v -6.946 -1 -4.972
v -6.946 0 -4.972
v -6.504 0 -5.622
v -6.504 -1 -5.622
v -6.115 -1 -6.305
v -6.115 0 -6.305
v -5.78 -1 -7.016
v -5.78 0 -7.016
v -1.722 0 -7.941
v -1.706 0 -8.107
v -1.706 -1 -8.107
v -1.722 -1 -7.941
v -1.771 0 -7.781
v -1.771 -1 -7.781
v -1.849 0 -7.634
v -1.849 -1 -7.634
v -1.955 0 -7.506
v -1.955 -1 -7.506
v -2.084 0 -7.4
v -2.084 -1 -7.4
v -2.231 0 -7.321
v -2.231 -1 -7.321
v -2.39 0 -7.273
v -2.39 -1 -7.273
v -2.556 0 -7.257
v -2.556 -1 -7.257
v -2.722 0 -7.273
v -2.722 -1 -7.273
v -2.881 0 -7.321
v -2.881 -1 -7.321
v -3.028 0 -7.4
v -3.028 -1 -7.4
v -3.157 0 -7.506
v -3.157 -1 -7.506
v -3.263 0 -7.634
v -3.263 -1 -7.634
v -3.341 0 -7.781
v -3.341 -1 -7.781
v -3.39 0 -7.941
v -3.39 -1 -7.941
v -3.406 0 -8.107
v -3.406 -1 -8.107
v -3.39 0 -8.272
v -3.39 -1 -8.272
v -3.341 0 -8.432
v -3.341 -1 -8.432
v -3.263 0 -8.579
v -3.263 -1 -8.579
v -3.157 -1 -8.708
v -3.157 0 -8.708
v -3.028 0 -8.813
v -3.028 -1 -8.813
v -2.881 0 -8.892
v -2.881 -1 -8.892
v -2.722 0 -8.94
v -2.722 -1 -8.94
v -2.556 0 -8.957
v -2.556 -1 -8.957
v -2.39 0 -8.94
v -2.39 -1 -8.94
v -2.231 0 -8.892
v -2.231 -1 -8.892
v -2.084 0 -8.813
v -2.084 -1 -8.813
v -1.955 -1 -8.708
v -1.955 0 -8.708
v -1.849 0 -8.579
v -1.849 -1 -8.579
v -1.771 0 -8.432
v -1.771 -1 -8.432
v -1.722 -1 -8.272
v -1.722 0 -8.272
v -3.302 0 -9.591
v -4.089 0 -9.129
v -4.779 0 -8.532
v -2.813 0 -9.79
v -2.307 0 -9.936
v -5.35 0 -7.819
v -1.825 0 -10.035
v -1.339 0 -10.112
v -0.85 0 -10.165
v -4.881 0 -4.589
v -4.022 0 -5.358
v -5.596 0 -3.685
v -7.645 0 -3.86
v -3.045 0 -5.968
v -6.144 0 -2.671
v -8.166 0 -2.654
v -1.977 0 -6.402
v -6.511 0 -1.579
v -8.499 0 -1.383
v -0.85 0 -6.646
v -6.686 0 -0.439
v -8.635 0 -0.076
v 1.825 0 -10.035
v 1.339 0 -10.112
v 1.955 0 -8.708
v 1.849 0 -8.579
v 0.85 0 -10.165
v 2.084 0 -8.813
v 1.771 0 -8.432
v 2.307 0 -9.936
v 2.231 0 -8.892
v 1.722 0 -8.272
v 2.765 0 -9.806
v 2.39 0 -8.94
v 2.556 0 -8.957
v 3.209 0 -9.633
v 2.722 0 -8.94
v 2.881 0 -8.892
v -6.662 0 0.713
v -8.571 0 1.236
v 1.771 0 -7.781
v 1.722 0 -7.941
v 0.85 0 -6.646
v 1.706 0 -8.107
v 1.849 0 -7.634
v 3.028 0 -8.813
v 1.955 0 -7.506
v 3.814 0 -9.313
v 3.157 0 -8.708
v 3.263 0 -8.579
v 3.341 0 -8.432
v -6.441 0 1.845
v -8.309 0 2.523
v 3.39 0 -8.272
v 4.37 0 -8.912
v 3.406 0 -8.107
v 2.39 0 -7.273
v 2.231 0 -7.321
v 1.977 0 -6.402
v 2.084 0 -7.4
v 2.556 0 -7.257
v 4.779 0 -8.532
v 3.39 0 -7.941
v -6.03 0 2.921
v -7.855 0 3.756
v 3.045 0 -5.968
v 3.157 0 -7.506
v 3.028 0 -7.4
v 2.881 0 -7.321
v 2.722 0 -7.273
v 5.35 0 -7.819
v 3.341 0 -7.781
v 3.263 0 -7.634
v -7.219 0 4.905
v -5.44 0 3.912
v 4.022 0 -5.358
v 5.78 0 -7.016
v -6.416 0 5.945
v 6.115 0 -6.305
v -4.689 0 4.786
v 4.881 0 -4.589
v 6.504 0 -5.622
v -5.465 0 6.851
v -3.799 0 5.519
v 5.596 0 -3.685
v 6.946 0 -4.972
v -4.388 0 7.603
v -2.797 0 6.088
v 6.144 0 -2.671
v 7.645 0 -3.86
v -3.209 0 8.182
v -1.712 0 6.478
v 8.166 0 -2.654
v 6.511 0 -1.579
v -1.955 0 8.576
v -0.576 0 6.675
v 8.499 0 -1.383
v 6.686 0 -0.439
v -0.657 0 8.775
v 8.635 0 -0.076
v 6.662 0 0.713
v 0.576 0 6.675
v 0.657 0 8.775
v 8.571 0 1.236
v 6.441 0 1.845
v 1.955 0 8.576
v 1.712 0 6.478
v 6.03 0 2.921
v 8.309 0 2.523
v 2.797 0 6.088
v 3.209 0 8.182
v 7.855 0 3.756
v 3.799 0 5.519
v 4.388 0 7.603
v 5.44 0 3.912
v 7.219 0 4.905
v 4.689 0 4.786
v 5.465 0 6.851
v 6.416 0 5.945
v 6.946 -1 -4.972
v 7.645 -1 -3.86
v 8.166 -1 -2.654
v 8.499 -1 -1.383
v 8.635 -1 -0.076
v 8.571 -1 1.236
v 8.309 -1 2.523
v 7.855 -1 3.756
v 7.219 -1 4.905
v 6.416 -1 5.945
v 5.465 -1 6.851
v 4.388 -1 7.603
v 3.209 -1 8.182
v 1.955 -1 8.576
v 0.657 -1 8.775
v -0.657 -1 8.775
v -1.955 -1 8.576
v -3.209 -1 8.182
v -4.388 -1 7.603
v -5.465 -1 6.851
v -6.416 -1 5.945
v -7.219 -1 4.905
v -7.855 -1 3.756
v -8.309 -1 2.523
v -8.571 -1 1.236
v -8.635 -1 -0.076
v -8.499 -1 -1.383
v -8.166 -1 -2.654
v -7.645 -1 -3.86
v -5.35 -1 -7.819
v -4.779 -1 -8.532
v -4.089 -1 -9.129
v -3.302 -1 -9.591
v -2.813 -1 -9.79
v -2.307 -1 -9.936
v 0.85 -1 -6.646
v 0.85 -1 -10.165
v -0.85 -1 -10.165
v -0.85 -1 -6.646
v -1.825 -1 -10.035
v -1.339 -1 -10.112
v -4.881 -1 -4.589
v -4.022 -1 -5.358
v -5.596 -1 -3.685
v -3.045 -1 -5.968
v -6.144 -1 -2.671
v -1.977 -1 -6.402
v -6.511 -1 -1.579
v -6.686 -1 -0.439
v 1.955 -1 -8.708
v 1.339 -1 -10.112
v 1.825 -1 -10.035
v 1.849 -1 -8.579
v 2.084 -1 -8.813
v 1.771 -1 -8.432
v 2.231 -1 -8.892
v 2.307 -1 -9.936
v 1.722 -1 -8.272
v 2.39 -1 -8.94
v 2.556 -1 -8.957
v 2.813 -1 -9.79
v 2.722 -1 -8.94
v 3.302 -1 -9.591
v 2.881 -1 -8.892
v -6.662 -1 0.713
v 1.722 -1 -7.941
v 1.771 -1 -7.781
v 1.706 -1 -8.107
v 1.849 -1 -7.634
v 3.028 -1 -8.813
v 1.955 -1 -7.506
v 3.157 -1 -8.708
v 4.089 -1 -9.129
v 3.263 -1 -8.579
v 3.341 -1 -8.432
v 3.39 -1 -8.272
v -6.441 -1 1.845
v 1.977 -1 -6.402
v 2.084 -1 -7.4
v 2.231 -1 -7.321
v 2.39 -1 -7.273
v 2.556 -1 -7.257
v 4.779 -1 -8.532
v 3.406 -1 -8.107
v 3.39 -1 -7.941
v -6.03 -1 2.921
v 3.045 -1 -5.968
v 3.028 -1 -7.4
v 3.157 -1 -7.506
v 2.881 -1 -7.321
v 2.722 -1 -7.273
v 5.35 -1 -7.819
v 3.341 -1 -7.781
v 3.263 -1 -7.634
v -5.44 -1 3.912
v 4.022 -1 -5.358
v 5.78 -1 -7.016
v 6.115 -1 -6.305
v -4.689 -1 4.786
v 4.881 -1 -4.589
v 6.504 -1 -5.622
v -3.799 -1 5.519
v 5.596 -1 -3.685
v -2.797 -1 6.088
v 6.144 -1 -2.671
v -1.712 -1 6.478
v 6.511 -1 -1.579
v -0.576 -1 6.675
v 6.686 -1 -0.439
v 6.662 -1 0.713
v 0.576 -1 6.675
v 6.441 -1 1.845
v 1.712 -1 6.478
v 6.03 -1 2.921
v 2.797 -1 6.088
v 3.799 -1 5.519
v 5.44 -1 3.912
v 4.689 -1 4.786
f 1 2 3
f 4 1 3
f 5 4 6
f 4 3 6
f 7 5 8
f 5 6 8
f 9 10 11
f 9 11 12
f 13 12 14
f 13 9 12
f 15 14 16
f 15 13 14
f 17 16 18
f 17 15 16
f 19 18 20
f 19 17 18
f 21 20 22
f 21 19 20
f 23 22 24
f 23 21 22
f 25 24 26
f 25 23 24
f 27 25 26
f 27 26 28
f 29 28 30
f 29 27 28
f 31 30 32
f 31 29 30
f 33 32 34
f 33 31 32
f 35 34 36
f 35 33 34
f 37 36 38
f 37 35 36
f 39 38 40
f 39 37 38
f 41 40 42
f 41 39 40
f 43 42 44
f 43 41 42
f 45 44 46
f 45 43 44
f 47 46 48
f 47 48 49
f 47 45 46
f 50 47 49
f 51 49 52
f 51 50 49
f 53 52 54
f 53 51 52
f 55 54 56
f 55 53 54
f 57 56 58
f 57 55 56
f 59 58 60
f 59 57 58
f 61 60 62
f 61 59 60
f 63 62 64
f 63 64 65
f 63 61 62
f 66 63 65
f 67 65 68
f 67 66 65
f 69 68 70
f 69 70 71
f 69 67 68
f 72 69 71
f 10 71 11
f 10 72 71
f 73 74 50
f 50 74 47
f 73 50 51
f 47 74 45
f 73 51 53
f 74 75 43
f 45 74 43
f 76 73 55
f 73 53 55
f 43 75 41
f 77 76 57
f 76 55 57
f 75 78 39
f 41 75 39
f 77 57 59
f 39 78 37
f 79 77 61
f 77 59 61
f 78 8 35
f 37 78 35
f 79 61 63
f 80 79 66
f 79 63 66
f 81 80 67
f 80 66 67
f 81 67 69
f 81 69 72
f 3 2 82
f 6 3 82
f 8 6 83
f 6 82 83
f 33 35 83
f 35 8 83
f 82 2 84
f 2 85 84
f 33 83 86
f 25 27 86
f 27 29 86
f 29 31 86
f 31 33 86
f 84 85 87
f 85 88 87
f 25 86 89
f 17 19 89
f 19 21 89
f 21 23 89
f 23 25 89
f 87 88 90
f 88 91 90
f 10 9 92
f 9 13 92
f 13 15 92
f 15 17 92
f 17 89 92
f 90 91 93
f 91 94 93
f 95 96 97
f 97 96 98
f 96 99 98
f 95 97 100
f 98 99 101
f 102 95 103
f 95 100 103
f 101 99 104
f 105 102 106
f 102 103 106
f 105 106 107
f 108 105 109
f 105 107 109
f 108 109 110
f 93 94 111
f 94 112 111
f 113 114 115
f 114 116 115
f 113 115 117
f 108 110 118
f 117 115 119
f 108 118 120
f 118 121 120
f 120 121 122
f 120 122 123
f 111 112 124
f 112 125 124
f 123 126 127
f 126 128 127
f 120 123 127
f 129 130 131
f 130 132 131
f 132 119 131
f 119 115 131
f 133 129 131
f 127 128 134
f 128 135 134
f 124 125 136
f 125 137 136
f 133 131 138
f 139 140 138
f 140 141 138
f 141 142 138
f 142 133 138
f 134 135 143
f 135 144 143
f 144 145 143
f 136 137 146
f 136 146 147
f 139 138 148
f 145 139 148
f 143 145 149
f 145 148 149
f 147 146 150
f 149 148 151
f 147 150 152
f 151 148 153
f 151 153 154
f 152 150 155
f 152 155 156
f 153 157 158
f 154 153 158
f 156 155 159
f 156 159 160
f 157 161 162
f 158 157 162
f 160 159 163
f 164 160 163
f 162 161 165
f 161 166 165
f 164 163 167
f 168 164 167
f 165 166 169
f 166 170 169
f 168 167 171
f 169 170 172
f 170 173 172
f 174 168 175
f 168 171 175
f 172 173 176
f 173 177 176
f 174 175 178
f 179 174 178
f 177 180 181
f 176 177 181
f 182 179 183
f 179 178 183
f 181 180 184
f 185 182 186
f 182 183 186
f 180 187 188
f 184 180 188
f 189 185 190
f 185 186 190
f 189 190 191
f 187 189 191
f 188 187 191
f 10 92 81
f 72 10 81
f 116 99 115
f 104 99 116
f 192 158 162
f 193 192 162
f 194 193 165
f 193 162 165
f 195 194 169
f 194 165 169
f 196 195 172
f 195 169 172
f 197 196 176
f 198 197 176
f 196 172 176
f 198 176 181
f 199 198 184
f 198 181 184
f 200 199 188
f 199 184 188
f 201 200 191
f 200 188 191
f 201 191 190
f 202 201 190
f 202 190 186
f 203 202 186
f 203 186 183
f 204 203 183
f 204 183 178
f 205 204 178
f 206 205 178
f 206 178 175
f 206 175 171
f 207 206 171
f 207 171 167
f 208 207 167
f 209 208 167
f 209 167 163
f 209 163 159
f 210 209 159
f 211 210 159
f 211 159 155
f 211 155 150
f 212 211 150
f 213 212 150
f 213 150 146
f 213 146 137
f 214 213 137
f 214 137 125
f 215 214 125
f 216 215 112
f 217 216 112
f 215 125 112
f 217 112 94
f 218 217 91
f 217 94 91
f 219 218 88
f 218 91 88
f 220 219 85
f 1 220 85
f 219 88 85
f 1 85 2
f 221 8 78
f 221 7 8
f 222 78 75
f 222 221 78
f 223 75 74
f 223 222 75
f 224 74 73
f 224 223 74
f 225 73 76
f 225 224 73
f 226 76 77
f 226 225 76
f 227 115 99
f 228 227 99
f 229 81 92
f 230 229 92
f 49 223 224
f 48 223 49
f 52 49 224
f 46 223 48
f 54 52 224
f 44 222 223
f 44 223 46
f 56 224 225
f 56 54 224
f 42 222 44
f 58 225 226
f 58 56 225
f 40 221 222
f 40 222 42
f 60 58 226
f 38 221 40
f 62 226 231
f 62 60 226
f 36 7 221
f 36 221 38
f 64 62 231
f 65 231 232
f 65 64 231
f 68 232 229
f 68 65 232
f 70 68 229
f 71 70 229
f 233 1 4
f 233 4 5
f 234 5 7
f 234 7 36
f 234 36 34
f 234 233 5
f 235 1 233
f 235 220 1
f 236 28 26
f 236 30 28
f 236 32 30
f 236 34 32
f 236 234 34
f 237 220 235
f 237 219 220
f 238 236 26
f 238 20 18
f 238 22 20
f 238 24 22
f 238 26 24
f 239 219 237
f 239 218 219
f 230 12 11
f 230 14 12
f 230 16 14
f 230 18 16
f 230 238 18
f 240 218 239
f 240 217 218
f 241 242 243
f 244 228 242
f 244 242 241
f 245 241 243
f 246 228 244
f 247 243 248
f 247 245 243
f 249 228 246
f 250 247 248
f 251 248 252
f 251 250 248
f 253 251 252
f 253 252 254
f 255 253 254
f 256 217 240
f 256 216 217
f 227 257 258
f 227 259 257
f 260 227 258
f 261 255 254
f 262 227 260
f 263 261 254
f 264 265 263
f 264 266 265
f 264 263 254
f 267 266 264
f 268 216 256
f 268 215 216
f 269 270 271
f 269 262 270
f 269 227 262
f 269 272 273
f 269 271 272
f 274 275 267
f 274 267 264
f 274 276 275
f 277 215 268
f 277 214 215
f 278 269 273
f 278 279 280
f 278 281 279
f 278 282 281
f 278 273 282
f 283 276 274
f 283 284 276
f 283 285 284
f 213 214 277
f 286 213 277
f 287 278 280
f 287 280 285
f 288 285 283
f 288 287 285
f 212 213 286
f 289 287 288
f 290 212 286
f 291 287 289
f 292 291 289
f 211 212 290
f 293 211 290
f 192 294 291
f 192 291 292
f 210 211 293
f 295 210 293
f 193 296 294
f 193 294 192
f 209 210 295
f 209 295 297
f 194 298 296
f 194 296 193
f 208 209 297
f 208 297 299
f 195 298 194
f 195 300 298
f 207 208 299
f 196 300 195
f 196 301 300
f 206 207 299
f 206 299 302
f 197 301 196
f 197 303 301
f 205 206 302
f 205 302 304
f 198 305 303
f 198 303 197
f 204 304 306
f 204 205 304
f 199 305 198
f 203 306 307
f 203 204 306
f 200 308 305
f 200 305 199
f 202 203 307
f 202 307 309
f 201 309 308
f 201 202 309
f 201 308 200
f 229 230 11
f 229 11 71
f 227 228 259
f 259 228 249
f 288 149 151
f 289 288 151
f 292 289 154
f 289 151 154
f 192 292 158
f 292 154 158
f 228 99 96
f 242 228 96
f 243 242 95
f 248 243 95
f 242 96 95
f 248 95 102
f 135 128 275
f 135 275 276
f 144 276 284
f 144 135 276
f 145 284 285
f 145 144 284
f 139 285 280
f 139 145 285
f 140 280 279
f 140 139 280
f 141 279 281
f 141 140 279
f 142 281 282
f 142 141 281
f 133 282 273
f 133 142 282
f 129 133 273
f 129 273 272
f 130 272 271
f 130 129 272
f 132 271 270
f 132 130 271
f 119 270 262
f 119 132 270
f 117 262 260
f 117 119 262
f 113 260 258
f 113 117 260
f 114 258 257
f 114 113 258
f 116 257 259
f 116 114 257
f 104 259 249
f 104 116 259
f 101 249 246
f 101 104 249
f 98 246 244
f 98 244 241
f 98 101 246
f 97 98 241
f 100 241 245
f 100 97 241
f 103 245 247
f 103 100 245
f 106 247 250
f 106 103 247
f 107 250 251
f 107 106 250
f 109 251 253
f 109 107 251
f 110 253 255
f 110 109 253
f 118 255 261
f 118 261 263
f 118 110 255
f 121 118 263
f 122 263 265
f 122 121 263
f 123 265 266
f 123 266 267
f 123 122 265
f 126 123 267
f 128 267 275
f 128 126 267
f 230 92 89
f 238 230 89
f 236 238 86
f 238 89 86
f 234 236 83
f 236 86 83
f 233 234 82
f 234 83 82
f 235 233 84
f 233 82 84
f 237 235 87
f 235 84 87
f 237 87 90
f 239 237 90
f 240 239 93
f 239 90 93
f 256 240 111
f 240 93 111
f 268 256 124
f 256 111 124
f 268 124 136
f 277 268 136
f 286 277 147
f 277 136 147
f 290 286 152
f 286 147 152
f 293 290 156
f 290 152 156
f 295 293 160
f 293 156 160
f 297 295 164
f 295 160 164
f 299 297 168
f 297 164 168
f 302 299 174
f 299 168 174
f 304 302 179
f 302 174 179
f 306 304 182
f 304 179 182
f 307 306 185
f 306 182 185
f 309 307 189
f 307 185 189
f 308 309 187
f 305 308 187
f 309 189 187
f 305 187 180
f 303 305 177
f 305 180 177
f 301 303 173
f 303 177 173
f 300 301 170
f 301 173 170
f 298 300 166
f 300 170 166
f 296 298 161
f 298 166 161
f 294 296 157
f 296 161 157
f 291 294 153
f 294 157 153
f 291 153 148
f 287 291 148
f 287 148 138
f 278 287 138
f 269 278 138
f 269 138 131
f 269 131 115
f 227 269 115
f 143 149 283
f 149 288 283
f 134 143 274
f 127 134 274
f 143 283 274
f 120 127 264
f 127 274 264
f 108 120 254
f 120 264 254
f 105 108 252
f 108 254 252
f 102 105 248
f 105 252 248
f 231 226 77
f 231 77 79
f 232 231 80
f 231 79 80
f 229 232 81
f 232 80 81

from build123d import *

# Parameters (mm, degrees)
F0_R        = 0.85
F1_DEPTH    = 1
F2_T1_DEPTH = 1
F3_R        = 5


# Not quite as in the source:
# - a fillet or chamfer that OpenCascade refuses, or shapes differently, is made with other operations: its cross-section is extruded or revolved along the edge and cut away or added


with BuildPart() as f1:
    # F0 (on Front) → F1 (new body)
    with BuildSketch(Plane.XZ):
        with BuildLine():
            ThreePointArc((-0.85, -6.6458633751), (0, 6.7), (0.85, -6.6458633751))
            Line((0.85, -6.6458633751), (0.85, -10.1645216316))
            ThreePointArc((0.85, -10.1645216316), (3.1164454592, -9.7122483339), (5.2228952278, -8.7613563698))
            Line((5.2228952278, -8.7613563698), (4.5, -7.2111025509))
            ThreePointArc((4.5, -7.2111025509), (0, 8.8), (-4.5, -7.2111025509))
            Line((-4.5, -7.2111025509), (-5.2228952278, -8.7613563698))
            ThreePointArc((-5.2228952278, -8.7613563698), (-3.1164454592, -9.7122483339), (-0.85, -10.1645216316))
            Line((-0.85, -10.1645216316), (-0.85, -6.6458633751))
        make_face()
        with Locations((-2.5559992958, -8.1065940814)):
            Circle(F0_R, mode=Mode.SUBTRACT)
        with Locations((2.5559992958, -8.1065940814)):
            Circle(F0_R, mode=Mode.SUBTRACT)
    extrude(amount=F1_DEPTH)

    # F2: fillet of radius 10 on 2 edges, made by hand

    # F2_s2 → F2_t1 (join)
    with BuildSketch(Plane.XZ):
        with BuildLine():
            ThreePointArc((-6.9462853719, -4.9724032485), (-5.8852649135, -6.7762174559), (-5.2228952278, -8.7613563698))
            Line((-5.2228952278, -8.7613563698), (-4.5, -7.2111025509))
            ThreePointArc((-4.5, -7.2111025509), (-5.8315783323, -6.210243371), (-6.9462853719, -4.9724032485))
        make_face()
        with BuildLine():
            ThreePointArc((5.2228952278, -8.7613563698), (5.8852649135, -6.7762174559), (6.9462853719, -4.9724032485))
            ThreePointArc((6.9462853719, -4.9724032485), (5.8315783323, -6.210243371), (4.5, -7.2111025509))
            Line((4.5, -7.2111025509), (5.2228952278, -8.7613563698))
        make_face()
    extrude(amount=F2_T1_DEPTH)

    # F3
    f3_edges = [f1.edges().sort_by_distance(p)[0] for p in [
        (-5.222895, -0.5, -8.761356),
        (5.222895, -0.5, -8.761356),
    ]]
    fillet(f3_edges, radius=F3_R)


solid = f1.part
